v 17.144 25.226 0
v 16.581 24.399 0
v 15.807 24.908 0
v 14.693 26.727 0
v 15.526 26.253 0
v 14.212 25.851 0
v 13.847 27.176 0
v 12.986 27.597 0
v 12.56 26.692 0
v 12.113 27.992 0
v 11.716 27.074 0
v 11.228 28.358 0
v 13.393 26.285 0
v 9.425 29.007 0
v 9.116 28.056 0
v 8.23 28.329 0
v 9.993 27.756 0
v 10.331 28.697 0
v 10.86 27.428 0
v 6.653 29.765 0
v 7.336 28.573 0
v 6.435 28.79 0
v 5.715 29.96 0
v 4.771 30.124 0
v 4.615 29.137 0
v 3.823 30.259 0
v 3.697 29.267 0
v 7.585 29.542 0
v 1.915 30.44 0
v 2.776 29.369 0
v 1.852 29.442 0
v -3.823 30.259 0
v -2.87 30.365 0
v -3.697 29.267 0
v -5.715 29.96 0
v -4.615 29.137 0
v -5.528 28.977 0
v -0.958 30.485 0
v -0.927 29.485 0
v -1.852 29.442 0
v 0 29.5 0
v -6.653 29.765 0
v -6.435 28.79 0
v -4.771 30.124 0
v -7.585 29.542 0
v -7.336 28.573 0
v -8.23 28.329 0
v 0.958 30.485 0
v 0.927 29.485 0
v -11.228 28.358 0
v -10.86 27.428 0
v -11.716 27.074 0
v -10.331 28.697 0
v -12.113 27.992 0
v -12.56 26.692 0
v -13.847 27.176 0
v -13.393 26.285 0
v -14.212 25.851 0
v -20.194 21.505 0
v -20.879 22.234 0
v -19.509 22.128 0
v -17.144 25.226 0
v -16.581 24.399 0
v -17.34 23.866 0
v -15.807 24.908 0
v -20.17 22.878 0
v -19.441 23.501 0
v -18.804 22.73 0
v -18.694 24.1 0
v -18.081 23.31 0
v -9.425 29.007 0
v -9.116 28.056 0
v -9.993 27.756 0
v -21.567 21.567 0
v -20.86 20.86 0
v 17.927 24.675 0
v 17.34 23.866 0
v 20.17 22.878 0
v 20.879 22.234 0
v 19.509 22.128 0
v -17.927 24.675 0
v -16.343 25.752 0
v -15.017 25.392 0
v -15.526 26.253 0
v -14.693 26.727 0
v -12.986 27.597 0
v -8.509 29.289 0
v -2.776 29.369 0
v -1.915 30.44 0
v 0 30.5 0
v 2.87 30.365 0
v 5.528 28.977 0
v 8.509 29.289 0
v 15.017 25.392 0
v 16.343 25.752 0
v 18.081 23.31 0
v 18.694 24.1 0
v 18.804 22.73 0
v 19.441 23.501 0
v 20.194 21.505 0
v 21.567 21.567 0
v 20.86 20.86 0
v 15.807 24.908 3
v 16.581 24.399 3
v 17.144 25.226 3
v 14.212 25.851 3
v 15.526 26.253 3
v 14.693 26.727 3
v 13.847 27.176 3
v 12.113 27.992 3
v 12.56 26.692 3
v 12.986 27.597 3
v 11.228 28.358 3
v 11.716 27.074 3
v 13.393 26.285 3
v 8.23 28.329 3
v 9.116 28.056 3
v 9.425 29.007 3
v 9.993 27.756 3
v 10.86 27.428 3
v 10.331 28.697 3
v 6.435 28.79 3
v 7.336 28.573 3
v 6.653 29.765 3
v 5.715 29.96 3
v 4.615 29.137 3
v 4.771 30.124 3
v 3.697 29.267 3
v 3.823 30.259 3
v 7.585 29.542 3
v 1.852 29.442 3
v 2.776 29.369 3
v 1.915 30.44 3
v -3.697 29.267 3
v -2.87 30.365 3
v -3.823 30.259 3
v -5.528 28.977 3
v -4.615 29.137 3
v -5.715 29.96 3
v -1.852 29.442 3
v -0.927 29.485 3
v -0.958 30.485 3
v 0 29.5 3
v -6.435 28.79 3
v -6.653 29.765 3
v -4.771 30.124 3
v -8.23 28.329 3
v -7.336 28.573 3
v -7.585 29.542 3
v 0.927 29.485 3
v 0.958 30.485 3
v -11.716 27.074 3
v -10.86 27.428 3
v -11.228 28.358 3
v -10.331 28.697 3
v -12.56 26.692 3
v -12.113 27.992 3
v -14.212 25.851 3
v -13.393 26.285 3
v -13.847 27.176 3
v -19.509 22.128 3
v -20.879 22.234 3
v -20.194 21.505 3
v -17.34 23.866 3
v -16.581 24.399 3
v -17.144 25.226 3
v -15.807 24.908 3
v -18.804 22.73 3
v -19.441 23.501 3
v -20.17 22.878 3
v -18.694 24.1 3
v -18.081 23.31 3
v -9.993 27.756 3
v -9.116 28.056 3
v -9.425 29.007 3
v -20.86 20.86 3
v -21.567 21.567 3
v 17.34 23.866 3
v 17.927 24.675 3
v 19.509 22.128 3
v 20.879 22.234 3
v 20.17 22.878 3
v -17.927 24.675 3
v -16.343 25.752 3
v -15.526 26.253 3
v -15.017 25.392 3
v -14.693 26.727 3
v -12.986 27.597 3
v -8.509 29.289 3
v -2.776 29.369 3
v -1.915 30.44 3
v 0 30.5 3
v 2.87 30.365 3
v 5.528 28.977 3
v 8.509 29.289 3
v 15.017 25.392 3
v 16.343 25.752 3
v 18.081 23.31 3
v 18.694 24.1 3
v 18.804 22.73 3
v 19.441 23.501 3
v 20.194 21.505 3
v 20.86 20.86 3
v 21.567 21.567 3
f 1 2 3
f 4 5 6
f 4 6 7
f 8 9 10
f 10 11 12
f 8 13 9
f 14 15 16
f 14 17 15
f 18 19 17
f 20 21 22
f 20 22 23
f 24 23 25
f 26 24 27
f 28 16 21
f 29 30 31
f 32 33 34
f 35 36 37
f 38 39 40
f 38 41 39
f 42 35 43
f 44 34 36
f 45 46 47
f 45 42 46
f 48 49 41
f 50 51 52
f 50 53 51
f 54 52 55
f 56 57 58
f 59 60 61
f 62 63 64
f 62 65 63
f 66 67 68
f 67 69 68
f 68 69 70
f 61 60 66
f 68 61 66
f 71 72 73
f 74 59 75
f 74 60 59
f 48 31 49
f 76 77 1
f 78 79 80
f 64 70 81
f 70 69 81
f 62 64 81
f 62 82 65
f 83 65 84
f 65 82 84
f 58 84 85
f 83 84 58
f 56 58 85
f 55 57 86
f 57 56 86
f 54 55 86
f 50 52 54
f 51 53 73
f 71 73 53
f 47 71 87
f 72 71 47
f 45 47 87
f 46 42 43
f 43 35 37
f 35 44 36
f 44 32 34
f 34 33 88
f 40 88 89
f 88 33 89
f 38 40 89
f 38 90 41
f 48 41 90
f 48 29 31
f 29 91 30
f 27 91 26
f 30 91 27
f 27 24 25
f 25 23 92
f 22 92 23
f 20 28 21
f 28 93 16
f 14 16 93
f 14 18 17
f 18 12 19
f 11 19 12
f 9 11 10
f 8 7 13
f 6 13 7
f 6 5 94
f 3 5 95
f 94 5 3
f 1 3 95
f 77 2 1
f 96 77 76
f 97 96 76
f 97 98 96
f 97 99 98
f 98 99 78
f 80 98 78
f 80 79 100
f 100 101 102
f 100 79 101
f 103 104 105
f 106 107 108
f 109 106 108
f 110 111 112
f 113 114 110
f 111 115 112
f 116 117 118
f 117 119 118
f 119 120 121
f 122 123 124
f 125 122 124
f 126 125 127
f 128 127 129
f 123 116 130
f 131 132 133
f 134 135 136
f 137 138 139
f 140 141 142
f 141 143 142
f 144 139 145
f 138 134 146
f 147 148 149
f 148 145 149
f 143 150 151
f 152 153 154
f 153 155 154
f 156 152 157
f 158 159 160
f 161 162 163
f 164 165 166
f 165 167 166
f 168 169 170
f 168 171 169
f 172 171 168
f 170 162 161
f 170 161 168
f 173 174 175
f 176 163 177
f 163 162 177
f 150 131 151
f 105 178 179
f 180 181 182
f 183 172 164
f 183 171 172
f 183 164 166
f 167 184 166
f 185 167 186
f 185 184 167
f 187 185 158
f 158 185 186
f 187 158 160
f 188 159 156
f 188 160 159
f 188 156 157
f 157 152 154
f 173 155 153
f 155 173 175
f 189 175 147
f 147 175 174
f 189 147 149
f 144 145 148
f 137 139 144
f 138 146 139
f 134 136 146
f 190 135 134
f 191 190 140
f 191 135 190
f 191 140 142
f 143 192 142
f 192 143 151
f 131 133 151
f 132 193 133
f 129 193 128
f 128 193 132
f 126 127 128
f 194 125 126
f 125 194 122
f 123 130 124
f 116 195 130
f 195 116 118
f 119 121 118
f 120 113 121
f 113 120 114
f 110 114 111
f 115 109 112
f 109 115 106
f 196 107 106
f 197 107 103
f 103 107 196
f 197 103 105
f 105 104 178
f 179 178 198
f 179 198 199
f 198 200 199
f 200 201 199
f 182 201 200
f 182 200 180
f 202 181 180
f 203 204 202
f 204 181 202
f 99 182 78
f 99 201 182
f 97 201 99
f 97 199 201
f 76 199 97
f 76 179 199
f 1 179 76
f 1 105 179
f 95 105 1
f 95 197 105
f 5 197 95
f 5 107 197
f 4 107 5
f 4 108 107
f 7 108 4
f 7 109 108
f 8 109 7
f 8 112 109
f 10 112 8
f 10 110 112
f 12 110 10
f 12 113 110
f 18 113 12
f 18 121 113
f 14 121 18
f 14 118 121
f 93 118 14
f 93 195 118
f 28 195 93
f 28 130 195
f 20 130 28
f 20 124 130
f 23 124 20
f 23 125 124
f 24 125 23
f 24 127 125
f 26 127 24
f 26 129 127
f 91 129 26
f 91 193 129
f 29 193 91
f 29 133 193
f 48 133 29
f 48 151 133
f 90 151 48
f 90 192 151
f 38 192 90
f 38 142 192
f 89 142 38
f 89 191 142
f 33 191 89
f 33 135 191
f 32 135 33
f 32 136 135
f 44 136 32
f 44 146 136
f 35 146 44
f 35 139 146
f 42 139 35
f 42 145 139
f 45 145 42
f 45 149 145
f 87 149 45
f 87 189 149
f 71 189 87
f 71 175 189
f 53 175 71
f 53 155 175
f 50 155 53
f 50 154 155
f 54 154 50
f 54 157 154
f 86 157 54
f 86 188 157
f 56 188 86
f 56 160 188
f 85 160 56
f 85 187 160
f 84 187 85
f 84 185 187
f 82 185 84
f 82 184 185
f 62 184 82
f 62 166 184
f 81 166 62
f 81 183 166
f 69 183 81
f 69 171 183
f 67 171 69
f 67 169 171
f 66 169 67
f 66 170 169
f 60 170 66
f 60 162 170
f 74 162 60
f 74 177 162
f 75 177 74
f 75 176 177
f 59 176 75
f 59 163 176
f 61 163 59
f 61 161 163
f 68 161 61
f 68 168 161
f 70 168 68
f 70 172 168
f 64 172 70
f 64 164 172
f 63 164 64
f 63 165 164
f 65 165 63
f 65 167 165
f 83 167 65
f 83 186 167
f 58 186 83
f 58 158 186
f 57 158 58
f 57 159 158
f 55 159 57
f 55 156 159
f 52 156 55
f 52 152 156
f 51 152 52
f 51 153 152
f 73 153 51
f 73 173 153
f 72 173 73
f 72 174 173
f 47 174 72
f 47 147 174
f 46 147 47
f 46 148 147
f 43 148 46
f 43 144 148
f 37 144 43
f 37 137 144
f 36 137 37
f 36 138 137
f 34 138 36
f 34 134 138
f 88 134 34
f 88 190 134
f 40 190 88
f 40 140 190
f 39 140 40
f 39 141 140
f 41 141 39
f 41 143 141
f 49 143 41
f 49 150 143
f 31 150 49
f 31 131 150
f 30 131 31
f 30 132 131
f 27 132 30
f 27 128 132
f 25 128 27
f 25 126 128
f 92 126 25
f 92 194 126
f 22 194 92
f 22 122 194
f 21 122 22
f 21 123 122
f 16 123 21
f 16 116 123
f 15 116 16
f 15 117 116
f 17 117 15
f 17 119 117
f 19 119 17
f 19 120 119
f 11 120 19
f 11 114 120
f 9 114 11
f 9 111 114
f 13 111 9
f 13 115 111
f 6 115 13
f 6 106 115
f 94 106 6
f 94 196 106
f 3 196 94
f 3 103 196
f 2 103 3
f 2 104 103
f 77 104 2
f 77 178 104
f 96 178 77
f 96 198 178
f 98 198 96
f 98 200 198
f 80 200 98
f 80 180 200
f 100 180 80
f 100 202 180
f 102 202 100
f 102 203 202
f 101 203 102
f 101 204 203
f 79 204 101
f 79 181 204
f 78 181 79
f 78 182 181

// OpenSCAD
/*
Plot a 2D or 3D arc from 0.1 to ~358 degrees.

Set Width of drawn arc, Radius, Thickness, resolution ($fn) and height for the 3D arc. Arc is centered around the origin

By tony@think3dprint3d.com
GPLv3

*/

3D_arc(w=1,r=30,deg=90,h=3,fn=200);

module 2D_arc(w, r, deg=90,fn = 100 ) {
	render() {
		difference() {
			// outer circle
			circle(r=r+w/2,center=true,$fn=fn);
			// outer circle
			circle(r=r-w/2,center=true,$fn=fn);

		//remove the areas not covered by the arc
		translate([sin(90-deg/2)*((r+w/2)*2),
						-sin(deg/2)*((r+w/2)*2)])
			rotate([0,0,90-deg/2])
				translate([((r+w/2))-sin(90-(deg)/4)*((r+w/2)),
							((r+w/2))*2-sin(90-(deg)/4)*((r+w/2))])
					square([sin(90-deg/4)*((r+w/2)*2),
								sin(90-deg/4)*((r+w/2)*2)],center=true);
		translate([-sin(90-(deg)/2)*((r+w/2)*2),
						-sin(deg/2)*((r+w/2)*2)])
			rotate([0,0,-(90-deg/2)])
			  translate([-((r+w/2))+sin(90-(deg)/4)*((r+w/2)),
							((r+w/2))*2-sin(90-(deg)/4)*((r+w/2))])
					square([sin(90-deg/4)*((r+w/2)*2),
								sin(90-deg/4)*((r+w/2)*2)],center=true);
		}
		//line to see the arc
		//#translate([-((r)*2)/2, sin((180-deg)/2)*(r)]) square([(r+w/2)*2+1,0.01]); 
	}
}

module 3D_arc(w, r, deg, h,fn) {
	linear_extrude(h)
			2D_arc(w, r, deg,fn);

}
